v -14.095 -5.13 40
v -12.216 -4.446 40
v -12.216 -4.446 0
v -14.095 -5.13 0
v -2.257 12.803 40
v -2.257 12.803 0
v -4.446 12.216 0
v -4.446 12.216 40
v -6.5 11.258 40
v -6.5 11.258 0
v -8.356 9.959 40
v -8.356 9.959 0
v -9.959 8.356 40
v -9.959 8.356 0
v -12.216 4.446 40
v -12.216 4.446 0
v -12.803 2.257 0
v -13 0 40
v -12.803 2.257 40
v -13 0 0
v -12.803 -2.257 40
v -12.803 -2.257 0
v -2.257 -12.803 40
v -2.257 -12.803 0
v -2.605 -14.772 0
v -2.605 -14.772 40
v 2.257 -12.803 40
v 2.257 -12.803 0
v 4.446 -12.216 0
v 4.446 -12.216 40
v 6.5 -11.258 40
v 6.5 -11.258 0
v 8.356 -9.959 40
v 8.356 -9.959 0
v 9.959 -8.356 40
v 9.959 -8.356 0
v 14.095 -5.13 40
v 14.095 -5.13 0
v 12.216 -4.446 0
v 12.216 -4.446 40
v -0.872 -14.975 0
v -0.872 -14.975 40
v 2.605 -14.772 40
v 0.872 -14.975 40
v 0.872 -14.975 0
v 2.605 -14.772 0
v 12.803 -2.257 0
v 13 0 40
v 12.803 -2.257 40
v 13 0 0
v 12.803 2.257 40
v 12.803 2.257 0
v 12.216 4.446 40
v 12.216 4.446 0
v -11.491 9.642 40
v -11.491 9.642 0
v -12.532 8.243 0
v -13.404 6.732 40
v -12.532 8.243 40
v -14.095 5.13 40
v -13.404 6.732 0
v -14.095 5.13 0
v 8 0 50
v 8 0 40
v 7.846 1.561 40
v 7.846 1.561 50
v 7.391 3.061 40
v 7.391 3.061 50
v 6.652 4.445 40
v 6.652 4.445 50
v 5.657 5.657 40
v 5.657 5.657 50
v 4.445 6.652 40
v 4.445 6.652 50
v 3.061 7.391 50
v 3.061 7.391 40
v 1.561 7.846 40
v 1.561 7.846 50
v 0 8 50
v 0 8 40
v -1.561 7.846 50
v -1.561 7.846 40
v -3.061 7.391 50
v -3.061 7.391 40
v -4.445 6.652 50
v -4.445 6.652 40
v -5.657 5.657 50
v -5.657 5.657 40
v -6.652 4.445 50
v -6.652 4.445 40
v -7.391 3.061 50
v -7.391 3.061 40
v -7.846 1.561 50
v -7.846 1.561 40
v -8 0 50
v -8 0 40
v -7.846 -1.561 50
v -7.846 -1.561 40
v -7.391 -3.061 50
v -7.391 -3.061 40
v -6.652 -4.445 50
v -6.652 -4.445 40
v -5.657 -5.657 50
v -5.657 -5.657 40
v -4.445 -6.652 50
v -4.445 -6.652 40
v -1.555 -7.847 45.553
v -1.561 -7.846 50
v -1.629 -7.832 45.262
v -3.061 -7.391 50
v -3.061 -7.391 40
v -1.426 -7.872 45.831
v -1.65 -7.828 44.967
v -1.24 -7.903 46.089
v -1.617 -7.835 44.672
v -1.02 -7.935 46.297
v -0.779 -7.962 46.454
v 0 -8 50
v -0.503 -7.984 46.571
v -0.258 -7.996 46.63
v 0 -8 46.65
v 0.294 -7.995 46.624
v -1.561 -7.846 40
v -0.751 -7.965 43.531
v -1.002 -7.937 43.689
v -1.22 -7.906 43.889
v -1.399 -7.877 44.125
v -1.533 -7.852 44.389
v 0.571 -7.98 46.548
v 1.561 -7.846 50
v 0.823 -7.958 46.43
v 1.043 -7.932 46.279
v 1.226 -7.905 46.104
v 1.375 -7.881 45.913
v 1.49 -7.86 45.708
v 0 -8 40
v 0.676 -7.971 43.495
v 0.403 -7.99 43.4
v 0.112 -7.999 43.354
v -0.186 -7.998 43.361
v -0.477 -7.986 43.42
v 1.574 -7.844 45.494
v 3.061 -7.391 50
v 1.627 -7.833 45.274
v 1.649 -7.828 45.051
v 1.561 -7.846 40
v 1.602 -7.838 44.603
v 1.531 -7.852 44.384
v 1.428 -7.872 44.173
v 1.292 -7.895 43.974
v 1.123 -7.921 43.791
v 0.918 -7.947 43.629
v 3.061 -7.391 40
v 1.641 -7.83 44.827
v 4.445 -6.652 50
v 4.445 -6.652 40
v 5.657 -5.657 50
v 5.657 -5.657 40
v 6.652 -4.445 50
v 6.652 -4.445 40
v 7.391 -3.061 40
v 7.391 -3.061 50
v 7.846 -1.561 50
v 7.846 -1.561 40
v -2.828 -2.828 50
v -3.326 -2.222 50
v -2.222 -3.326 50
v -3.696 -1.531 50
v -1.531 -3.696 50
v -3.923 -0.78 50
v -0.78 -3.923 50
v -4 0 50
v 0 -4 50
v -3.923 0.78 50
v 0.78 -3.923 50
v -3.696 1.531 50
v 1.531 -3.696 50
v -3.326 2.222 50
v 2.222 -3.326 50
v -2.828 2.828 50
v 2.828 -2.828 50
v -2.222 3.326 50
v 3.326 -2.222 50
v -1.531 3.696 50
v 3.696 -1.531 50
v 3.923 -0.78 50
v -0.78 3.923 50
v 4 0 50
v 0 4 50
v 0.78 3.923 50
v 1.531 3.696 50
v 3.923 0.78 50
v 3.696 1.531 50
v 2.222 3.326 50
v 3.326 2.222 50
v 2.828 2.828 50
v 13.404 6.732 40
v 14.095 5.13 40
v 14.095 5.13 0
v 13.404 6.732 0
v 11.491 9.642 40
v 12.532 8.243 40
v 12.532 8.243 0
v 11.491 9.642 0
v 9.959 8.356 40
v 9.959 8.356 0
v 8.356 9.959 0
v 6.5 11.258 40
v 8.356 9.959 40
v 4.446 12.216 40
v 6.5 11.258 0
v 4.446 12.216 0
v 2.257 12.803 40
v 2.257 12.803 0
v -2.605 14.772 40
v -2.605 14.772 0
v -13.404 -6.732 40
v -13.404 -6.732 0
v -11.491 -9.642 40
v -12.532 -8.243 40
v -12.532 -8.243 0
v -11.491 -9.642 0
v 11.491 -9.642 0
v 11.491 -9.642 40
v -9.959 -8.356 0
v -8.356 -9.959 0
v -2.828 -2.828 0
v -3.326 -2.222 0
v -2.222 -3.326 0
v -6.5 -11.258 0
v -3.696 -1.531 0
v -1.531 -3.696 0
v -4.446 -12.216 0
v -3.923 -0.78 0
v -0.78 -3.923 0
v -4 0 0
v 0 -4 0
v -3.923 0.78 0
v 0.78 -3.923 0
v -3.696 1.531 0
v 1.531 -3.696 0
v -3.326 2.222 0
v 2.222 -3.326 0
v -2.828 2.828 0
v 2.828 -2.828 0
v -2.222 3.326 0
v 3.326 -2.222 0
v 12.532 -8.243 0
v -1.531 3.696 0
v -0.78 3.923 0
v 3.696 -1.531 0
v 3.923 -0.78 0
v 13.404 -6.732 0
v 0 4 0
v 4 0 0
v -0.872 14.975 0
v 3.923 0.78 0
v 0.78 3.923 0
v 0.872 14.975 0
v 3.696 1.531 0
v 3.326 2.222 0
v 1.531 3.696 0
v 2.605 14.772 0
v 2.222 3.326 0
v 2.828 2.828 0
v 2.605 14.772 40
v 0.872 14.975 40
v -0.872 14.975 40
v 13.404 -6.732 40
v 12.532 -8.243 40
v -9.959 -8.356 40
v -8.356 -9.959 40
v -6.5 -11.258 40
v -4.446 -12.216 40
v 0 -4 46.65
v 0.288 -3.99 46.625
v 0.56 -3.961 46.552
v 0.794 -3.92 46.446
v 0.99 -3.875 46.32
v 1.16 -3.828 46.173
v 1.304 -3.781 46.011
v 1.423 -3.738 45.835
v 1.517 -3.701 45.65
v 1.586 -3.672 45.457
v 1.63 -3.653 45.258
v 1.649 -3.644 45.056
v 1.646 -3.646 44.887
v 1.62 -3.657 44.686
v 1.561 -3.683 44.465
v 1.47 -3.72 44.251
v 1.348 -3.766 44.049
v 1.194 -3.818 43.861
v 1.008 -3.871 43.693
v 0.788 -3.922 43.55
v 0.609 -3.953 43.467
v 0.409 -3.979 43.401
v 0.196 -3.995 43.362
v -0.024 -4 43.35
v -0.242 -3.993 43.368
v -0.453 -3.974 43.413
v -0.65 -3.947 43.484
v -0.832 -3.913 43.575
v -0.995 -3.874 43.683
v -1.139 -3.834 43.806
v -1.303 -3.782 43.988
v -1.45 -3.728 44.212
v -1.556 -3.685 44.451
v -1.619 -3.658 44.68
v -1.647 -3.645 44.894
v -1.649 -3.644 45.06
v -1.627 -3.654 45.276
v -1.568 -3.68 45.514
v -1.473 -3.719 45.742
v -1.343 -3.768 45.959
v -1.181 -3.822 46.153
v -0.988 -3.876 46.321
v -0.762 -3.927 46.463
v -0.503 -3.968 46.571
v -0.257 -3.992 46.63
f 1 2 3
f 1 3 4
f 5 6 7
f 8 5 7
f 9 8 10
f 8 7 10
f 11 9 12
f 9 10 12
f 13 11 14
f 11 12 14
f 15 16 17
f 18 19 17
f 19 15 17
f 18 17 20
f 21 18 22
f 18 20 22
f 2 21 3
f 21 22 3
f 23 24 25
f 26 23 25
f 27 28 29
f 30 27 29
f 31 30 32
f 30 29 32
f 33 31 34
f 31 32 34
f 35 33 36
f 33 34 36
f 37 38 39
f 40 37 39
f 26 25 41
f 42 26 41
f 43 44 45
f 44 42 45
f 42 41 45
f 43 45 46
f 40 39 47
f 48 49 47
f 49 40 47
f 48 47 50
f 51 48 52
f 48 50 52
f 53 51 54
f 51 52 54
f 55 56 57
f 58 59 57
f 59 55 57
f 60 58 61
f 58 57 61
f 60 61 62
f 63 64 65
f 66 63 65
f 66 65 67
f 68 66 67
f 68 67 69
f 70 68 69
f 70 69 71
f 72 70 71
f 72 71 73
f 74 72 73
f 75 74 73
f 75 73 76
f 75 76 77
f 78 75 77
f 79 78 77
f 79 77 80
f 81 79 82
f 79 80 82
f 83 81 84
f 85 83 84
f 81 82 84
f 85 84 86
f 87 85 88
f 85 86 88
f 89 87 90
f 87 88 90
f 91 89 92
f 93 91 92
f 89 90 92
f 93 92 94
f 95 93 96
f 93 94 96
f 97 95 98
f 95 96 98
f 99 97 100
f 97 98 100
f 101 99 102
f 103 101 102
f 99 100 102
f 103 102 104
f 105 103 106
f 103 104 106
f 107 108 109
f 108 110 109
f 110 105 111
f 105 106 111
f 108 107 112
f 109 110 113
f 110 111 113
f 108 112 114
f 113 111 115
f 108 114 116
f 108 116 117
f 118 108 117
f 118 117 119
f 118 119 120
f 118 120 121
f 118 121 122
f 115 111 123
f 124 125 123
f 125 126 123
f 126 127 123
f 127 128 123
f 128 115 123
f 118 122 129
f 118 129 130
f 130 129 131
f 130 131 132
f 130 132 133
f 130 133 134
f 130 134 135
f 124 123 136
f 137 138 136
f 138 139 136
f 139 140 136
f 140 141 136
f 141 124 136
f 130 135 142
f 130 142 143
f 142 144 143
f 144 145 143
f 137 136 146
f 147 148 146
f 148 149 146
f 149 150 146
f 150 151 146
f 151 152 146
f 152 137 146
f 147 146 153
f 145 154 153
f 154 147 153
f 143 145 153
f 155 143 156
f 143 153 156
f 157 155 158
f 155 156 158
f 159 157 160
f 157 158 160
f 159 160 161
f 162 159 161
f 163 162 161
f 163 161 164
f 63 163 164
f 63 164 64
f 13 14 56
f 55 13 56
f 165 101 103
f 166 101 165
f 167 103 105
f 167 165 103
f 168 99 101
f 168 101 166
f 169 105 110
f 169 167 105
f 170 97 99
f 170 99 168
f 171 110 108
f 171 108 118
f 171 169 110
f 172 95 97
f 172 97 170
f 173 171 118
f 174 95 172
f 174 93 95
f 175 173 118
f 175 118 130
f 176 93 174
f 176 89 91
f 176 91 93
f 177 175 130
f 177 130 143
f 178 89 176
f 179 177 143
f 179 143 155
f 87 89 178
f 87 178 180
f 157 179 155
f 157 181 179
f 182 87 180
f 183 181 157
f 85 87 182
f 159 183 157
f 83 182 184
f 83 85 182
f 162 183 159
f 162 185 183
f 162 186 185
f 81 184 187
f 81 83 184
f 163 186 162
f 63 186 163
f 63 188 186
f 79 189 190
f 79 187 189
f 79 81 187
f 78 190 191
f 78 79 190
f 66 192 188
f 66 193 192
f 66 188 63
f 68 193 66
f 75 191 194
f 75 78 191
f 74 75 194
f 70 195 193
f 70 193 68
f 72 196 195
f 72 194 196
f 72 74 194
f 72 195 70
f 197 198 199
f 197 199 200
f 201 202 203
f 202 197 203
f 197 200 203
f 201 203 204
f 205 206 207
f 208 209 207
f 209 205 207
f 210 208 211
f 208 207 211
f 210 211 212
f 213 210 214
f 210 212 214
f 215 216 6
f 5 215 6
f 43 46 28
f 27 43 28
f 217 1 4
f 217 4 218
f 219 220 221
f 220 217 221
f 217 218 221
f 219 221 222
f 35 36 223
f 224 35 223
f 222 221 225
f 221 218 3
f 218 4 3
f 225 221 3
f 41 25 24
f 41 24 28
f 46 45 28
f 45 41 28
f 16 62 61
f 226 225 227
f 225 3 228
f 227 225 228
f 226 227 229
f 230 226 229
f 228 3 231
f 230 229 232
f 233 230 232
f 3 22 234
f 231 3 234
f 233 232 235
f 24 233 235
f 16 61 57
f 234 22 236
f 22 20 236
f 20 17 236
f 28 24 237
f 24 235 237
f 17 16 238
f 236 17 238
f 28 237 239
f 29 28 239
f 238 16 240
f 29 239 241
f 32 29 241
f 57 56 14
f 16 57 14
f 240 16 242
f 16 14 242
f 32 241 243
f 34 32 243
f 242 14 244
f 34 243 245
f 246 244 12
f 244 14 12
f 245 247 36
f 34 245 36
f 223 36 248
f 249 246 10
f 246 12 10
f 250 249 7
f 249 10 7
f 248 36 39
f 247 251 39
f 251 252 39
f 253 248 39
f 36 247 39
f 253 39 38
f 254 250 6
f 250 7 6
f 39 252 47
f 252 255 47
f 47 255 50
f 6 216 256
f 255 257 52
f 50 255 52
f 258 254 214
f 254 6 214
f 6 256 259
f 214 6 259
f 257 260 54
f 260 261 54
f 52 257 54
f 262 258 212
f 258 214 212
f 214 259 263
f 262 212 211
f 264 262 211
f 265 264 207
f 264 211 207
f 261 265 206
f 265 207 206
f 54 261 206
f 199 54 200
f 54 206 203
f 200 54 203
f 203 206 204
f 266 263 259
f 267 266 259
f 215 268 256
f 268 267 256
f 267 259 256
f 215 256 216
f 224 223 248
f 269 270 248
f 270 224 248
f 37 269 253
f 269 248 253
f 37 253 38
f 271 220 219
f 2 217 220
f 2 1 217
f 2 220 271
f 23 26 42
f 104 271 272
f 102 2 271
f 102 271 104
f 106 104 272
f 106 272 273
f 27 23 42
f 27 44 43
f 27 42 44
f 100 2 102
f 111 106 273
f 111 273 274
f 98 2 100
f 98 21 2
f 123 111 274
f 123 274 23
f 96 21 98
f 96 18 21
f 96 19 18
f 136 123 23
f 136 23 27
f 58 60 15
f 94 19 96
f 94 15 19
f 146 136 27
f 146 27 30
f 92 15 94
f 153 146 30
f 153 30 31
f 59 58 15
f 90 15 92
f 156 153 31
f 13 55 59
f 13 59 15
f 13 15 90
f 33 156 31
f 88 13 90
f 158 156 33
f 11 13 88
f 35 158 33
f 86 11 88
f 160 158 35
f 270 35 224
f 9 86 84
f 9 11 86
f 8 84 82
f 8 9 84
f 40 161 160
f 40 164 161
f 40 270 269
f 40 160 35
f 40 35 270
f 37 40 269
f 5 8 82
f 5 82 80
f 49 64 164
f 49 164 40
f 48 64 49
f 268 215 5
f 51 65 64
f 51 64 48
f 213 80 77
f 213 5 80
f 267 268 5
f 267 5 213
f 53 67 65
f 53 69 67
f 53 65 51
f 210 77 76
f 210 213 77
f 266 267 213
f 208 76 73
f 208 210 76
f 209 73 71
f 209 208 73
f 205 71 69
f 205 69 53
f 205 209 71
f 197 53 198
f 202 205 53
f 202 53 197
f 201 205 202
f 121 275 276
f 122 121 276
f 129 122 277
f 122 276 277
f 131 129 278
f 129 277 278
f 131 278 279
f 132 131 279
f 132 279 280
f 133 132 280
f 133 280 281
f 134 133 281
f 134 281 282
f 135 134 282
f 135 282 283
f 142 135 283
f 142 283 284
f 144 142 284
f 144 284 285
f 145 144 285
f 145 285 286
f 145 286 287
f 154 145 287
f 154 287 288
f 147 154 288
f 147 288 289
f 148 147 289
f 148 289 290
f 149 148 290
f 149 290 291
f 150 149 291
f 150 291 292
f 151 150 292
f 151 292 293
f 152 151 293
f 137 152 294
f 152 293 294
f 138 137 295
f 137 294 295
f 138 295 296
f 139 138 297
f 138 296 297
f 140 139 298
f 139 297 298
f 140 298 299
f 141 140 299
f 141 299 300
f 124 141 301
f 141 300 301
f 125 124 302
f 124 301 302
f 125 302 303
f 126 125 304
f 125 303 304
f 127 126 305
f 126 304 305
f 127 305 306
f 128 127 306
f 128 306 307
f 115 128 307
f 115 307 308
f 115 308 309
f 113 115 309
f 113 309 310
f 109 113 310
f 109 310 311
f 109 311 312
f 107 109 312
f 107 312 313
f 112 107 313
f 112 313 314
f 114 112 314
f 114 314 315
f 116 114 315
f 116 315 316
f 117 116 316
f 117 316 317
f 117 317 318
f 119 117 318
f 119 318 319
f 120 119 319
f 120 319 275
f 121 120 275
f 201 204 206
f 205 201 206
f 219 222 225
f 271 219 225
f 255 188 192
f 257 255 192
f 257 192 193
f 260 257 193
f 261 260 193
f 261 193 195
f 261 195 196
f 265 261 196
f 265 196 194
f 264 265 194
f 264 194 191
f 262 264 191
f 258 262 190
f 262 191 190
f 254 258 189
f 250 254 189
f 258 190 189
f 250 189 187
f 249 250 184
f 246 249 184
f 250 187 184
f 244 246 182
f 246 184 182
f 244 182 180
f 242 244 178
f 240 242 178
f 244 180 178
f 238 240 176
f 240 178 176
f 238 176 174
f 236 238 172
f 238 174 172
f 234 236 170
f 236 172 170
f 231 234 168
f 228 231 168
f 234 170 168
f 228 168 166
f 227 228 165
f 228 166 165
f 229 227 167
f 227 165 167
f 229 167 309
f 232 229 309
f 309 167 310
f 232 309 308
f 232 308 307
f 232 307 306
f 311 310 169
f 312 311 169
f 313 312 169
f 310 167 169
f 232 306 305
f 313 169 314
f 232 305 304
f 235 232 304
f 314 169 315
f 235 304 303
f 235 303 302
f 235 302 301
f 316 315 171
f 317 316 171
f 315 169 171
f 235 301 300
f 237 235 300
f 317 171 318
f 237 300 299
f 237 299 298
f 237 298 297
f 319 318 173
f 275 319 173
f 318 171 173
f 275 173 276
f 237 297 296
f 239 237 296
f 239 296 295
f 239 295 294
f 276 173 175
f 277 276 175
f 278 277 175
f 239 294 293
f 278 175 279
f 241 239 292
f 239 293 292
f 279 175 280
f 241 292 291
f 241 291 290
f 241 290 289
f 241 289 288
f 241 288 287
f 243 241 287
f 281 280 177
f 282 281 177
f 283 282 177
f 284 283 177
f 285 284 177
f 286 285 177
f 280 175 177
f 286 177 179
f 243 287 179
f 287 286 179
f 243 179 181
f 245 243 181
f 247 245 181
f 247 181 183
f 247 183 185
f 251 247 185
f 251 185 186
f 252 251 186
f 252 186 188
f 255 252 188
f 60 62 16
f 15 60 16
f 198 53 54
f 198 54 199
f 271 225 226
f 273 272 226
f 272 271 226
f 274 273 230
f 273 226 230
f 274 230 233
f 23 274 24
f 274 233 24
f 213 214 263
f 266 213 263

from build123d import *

# Parameters (mm, degrees)
ESQUISSE1_R             = 60
BOSS_EXTRU_1_DEPTH      = 40
CUT_EXTRUDE4_DEPTH      = 94.808315196
CIRPATTERN1_COUNT       = 10
SKETCH4_R               = 8
BOSS_EXTRUDE1_DEPTH     = 10
SKETCH5_R               = 4
CUT_EXTRUDE5_DEPTH      = 99.488578018
CUT_EXTRUDE6_START      = -20
CUT_EXTRUDE6_DEPTH      = 20
CIRPATTERN2_COUNT       = 15
CUT_EXTRUDE7_DEPTH      = 20
CIRPATTERN3_COUNT       = 15
CUT_EXTRUDE8_DEPTH      = 94.808315196
CUT_EXTRUDE8_DEPTH_BACK = 94.808315196
SKETCH8_OUTSIDE_W       = 157.384
SKETCH8_OUTSIDE_H       = 157.384
CUT_EXTRUDE9_REACH      = 56.071
CUT_EXTRUDE9_END_RADIUS = 8
SKETCH9_R               = 1.65


with BuildPart() as part:
    # Esquisse1 → Boss.-Extru.1 (new body)
    with BuildSketch(Plane.XY):
        Circle(ESQUISSE1_R)
    extrude(amount=BOSS_EXTRU_1_DEPTH)

    # Sketch3 → Cut-Extrude4 (cut, symmetric)
    with BuildSketch(Plane.XY):
        with BuildLine():
            Line((-3.943348831, 23.180571367), (-7.5, 44.087980221))
            ThreePointArc((-7.5, 44.087980221), (-6.481937987, 48.04148707), (-2.856459957, 49.918339681))
            ThreePointArc((-2.856459957, 49.918339681), (0, 50), (2.856459957, 49.918339681))
            ThreePointArc((2.856459957, 49.918339681), (6.481937987, 48.04148707), (7.5, 44.087980221))
            Line((7.5, 44.087980221), (3.943348831, 23.180571367))
            ThreePointArc((3.943348831, 23.180571367), (0, 19.85139176), (-3.943348831, 23.180571367))
        make_face()
    cut_extrude4 = extrude(amount=CUT_EXTRUDE4_DEPTH, both=True, mode=Mode.SUBTRACT)

    # CirPattern1: Cut-Extrude4 ×10 about axis
    cirpattern1_axis = Axis((0, 0, 0), (0, 0, 1))
    for i in range(1, CIRPATTERN1_COUNT):
        add(cut_extrude4.rotate(cirpattern1_axis, i * 360 / CIRPATTERN1_COUNT), mode=Mode.SUBTRACT)

    # Sketch4 → Boss-Extrude1 (add)
    with BuildSketch(Plane.XY.offset(40)):
        Circle(SKETCH4_R)
    extrude(amount=BOSS_EXTRUDE1_DEPTH)

    # Sketch5 → Cut-Extrude5 (cut, through all)
    with BuildSketch(Plane.XY.offset(50)):
        Circle(SKETCH5_R)
    extrude(amount=-CUT_EXTRUDE5_DEPTH, mode=Mode.SUBTRACT)

    # Sketch6 → Cut-Extrude6 (cut)
    with BuildSketch(Plane.XY.offset(40).offset(CUT_EXTRUDE6_START)):
        with BuildLine():
            Line((14.752685571, 55.057772098), (15.529142706, 57.955549577))
            ThreePointArc((15.529142706, 57.955549577), (12.986376836, 58.577760427), (10.41889066, 59.088465181))
            Line((10.41889066, 59.088465181), (9.897946127, 56.134041922))
            ThreePointArc((9.897946127, 56.134041922), (12.337057994, 55.648872406), (14.752685571, 55.057772098))
        make_face()
    cut_extrude6 = extrude(amount=CUT_EXTRUDE6_DEPTH, mode=Mode.SUBTRACT)

    # CirPattern2: Cut-Extrude6 ×15 about axis
    cirpattern2_axis = Axis((0, 0, 0), (0, 0, 1))
    for i in range(1, CIRPATTERN2_COUNT):
        add(cut_extrude6.rotate(cirpattern2_axis, i * 360 / CIRPATTERN2_COUNT), mode=Mode.SUBTRACT)

    # Sketch7 → Cut-Extrude7 (cut)
    with BuildSketch(Plane(origin=(0, 0, 0), x_dir=(-1, 0, 0), z_dir=(0, 0, -1))):
        with BuildLine():
            Line((-2.617163242, 59.942893295), (-2.48630508, 56.94574863))
            ThreePointArc((-2.48630508, 56.94574863), (0, 57), (2.48630508, 56.94574863))
            Line((2.48630508, 56.94574863), (2.617163242, 59.942893295))
            ThreePointArc((2.617163242, 59.942893295), (0, 60), (-2.617163242, 59.942893295))
        make_face()
    cut_extrude7 = extrude(amount=-CUT_EXTRUDE7_DEPTH, mode=Mode.SUBTRACT)

    # CirPattern3: Cut-Extrude7 ×15 about axis
    cirpattern3_axis = Axis((0, 0, 0), (0, 0, 1))
    for i in range(1, CIRPATTERN3_COUNT):
        add(cut_extrude7.rotate(cirpattern3_axis, i * 360 / CIRPATTERN3_COUNT), mode=Mode.SUBTRACT)

    # Sketch8 outside → Cut-Extrude8 (cut, two sides: drawn at the far end of the back side and taken through both)
    with BuildSketch(Plane.XY.offset(40).offset(-CUT_EXTRUDE8_DEPTH_BACK)):
        Rectangle(SKETCH8_OUTSIDE_W, SKETCH8_OUTSIDE_H)
        with BuildLine():
            Line((-2.604722665, 14.772116295), (-2.25742631, 12.802500789))
            ThreePointArc((-2.25742631, 12.802500789), (-6.5, 11.258330249), (-9.958577761, 8.356238926))
            Line((-9.958577761, 8.356238926), (-11.490666647, 9.641814145))
            ThreePointArc((-11.490666647, 9.641814145), (-12.990381057, 7.5), (-14.095389312, 5.13030215))
            Line((-14.095389312, 5.13030215), (-12.21600407, 4.446261863))
            ThreePointArc((-12.21600407, 4.446261863), (-13, 0), (-12.21600407, -4.446261863))
            Line((-12.21600407, -4.446261863), (-14.095389312, -5.13030215))
            ThreePointArc((-14.095389312, -5.13030215), (-12.990381057, -7.5), (-11.490666647, -9.641814145))
            Line((-11.490666647, -9.641814145), (-9.958577761, -8.356238926))
            ThreePointArc((-9.958577761, -8.356238926), (-6.5, -11.258330249), (-2.25742631, -12.802500789))
            Line((-2.25742631, -12.802500789), (-2.604722665, -14.772116295))
            ThreePointArc((-2.604722665, -14.772116295), (0, -15), (2.604722665, -14.772116295))
            Line((2.604722665, -14.772116295), (2.25742631, -12.802500789))
            ThreePointArc((2.25742631, -12.802500789), (6.5, -11.258330249), (9.958577761, -8.356238926))
            Line((9.958577761, -8.356238926), (11.490666647, -9.641814145))
            ThreePointArc((11.490666647, -9.641814145), (12.990381057, -7.5), (14.095389312, -5.13030215))
            Line((14.095389312, -5.13030215), (12.21600407, -4.446261863))
            ThreePointArc((12.21600407, -4.446261863), (13, 0), (12.21600407, 4.446261863))
            Line((12.21600407, 4.446261863), (14.095389312, 5.13030215))
            ThreePointArc((14.095389312, 5.13030215), (12.990381057, 7.5), (11.490666647, 9.641814145))
            Line((11.490666647, 9.641814145), (9.958577761, 8.356238926))
            ThreePointArc((9.958577761, 8.356238926), (6.5, 11.258330249), (2.25742631, 12.802500789))
            Line((2.25742631, 12.802500789), (2.604722665, 14.772116295))
            ThreePointArc((2.604722665, 14.772116295), (0, 15), (-2.604722665, 14.772116295))
        make_face(mode=Mode.SUBTRACT)
    extrude(amount=CUT_EXTRUDE8_DEPTH + CUT_EXTRUDE8_DEPTH_BACK, mode=Mode.SUBTRACT)

    # Cut-Extrude9: up to this cylinder (the profile starts inside it)
    cut_extrude9_end = Plane(origin=(0, 0, 45), z_dir=(0, 0, -1)) * Cylinder(CUT_EXTRUDE9_END_RADIUS, 129.142, mode=Mode.PRIVATE)
    # Sketch9 → Cut-Extrude9 (cut, up to the surface)
    with BuildSketch(Plane(origin=(0, 0, 0), x_dir=(1, 0, 0), z_dir=(0, 1, 0)), mode=Mode.PRIVATE) as cut_extrude9_sk1:
        with Locations(Location((0, -45, 0), (0, 0, 270))):
            Circle(SKETCH9_R)
    cut_extrude9_tool1 = extrude(cut_extrude9_sk1.sketch, amount=-CUT_EXTRUDE9_REACH, mode=Mode.PRIVATE) & cut_extrude9_end
    add(cut_extrude9_tool1.solids().sort_by_distance((0, 0, 45))[0], mode=Mode.SUBTRACT)


solid = part.part
